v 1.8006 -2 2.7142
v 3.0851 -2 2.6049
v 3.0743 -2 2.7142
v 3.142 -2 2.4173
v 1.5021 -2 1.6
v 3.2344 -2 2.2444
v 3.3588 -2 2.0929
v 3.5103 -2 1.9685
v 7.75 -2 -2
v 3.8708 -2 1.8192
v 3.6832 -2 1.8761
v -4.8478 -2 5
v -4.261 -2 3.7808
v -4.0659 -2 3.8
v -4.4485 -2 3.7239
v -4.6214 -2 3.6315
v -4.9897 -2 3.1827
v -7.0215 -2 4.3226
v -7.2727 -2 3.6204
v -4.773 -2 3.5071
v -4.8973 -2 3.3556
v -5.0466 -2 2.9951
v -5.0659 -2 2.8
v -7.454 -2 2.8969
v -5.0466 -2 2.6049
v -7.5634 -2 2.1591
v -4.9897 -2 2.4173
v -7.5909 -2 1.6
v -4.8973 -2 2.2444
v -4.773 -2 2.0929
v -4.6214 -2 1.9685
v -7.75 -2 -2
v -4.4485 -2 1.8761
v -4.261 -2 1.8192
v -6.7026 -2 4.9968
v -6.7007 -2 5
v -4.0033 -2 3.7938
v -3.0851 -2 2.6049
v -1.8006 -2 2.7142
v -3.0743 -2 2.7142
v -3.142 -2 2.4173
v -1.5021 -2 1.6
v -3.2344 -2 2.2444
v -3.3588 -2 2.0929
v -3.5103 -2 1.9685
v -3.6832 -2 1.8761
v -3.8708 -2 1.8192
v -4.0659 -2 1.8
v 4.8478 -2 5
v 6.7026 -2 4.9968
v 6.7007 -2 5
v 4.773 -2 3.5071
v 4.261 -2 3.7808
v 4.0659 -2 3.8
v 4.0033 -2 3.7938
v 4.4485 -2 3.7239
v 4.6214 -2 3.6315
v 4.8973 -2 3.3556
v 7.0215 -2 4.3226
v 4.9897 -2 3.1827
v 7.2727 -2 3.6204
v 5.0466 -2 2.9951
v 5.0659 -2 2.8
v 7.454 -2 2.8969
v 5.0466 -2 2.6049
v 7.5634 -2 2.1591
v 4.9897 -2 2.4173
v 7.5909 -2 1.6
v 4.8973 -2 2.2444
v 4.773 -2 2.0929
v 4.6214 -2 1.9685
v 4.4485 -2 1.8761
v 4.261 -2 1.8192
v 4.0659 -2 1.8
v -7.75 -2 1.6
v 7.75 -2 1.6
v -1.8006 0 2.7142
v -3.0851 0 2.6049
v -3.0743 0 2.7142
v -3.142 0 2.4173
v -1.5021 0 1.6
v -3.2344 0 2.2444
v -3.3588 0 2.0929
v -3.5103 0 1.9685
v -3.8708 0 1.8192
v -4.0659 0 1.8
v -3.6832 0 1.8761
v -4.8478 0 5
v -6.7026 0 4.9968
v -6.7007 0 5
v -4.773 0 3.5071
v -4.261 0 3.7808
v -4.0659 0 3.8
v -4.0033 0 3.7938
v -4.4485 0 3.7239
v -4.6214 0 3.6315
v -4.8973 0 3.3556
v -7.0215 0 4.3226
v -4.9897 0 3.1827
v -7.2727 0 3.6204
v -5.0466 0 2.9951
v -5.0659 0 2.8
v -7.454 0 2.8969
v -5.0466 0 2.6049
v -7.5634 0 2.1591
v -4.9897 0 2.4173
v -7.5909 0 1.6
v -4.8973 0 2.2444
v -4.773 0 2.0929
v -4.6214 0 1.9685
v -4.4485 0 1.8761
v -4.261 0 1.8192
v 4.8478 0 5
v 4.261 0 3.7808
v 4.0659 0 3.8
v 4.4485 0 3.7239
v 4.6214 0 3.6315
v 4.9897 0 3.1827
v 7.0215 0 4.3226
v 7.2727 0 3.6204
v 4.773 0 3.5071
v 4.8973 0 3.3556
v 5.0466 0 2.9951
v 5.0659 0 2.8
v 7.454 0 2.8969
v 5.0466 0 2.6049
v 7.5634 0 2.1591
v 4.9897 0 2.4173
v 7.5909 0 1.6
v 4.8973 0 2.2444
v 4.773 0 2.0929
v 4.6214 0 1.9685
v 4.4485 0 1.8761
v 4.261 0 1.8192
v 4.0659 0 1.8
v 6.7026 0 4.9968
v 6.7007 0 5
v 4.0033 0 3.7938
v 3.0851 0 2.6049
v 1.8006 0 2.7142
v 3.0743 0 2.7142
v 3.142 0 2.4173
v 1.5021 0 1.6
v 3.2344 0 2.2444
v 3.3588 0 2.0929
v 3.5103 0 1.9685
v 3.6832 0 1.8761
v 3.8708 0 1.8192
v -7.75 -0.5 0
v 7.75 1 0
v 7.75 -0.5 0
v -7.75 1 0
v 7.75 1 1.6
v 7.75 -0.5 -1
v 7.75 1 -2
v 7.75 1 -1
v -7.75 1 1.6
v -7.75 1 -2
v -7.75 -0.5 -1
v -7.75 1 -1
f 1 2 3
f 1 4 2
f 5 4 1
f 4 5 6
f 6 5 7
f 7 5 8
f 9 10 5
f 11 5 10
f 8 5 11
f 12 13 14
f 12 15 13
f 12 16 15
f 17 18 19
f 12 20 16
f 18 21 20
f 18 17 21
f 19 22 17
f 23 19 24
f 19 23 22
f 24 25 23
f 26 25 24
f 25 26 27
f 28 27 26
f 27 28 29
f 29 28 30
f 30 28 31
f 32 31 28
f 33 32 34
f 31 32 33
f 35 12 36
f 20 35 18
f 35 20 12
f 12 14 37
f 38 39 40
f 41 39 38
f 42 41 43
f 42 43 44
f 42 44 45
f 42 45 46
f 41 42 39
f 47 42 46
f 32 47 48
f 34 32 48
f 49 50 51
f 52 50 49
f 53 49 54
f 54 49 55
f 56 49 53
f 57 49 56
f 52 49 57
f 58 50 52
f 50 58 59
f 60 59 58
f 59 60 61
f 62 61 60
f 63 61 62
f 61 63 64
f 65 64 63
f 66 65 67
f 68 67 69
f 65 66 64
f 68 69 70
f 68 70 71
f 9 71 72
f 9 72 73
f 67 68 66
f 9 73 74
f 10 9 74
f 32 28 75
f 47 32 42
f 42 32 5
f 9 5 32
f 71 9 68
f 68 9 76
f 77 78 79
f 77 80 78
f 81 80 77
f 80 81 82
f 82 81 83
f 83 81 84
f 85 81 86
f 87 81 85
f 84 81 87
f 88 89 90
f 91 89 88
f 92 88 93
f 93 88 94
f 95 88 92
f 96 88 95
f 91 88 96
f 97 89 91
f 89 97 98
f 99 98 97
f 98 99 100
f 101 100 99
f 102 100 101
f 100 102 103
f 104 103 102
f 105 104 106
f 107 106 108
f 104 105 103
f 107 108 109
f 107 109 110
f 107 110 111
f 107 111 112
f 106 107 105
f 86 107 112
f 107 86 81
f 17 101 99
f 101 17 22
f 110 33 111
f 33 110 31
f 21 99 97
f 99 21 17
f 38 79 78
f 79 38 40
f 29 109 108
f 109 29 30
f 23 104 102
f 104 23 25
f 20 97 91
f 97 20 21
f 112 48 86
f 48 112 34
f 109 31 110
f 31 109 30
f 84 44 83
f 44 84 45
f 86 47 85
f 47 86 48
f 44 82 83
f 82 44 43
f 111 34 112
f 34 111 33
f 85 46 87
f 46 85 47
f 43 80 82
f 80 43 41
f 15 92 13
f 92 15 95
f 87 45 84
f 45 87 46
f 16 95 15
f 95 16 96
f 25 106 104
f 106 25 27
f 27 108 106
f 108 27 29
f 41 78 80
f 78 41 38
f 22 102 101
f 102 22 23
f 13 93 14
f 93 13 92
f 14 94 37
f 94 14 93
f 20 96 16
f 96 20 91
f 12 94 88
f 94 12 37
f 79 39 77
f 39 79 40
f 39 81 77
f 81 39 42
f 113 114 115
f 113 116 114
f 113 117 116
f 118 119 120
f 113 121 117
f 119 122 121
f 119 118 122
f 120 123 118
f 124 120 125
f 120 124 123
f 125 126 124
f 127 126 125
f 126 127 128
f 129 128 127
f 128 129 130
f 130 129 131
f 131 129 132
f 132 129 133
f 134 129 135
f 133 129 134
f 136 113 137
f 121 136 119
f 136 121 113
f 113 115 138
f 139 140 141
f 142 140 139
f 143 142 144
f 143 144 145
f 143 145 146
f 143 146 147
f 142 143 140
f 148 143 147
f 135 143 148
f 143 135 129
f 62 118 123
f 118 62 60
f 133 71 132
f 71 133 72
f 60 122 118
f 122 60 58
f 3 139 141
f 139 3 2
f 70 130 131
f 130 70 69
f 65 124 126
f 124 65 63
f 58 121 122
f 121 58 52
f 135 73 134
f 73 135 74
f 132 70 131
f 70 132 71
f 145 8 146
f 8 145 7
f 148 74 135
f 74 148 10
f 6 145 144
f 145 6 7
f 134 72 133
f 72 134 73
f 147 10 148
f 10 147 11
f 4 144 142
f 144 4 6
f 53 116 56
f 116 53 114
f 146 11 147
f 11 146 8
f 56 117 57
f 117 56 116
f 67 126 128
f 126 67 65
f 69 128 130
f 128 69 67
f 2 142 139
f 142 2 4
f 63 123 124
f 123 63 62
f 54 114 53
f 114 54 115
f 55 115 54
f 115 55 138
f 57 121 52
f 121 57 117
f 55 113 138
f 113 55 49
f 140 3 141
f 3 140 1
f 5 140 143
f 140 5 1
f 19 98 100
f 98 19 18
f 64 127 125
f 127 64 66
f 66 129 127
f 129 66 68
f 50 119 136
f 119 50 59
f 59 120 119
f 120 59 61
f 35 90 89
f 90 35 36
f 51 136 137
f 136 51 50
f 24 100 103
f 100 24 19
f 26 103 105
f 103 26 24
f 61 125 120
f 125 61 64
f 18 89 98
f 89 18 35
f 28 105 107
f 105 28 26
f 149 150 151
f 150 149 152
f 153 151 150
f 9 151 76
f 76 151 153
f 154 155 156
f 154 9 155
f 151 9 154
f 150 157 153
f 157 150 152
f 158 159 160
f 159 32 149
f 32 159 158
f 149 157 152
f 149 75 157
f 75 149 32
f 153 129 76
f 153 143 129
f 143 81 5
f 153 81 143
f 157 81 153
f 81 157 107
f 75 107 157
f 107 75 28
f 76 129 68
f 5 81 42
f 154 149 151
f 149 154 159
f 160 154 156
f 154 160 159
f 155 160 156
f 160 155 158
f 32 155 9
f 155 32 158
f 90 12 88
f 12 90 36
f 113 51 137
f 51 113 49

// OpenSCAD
DEBUG_LAYER = 10;
WIRE_DIAMETER = 2;
WIRE_RADIUS = WIRE_DIAMETER / 2;
MARBLE_DIAMETER = 9.5;
MARBLE_RADIUS = MARBLE_DIAMETER / 2;
HOLDER_WIDTH = 1.5;
DEFAULT_SPACE_OFFSET = 1.1;
DEFAULT_HEIGHT = 2;
SQRT22 = sqrt(2) / 2;

module tube(inner, outer, h = DEFAULT_HEIGHT, $fn = 32) {
    in = min(outer, inner);
    out = max(outer, inner);
    
    difference() {
        cylinder(h, out, out, $fn);
        translate([0, 0, -1]) 
            cylinder(h+2, in, in,  $fn);
    };
}

module rtCylinder(radius, posX, rotate, isTrim = false, h = DEFAULT_HEIGHT, $fn = 32, $posY = 0, $innerRotation = 0) {    
    rotate(rotate) {
        if (isTrim) {            
            translate([posX, $posY, -1])
                rotate($innerRotation)
                    cylinder(h + 2, radius, radius, $fn = $fn);
        } else {
            translate([posX, $posY, 0])
                rotate($innerRotation)
                    cylinder(h, radius, radius, $fn = $fn);
        }        
    }; 
}

module rtCube(width, length, posX, rotate, isTrim = false, h = DEFAULT_HEIGHT, $center = false, $posY = 0) {
    translateZ = $center ? h / 2 : isTrim ? -1 : 0;
    height = isTrim ? h + 2 : h;
    
    rotate(rotate)
        translate([posX, $posY, translateZ])
            cube([width, length, height], center = $center);
}



module wireHolder(scale = 1, rotate = -135, width = 1, h = DEFAULT_HEIGHT) {
    wireRadius = WIRE_RADIUS * scale;
    
    difference() {
        rotate([0, 0, rotate])
            translate([MARBLE_RADIUS + wireRadius, 0, 0]) {
                cutSide = wireRadius * 3;
                
                difference() {   
                    tube(wireRadius, cutSide * 1.2, h);
                                        
                    rtCube(cutSide, cutSide, -wireRadius * 2 * SQRT22, 80, true, h, $center = true, $posY = cutSide * SQRT22);                rtCube(cutSide, cutSide, -wireRadius * 2 * SQRT22, 45, true, h, $center = true, $posY = cutSide * SQRT22);        

                    rtCube(
                        MARBLE_RADIUS * 2, 
                        MARBLE_RADIUS * .8, 
                        -wireRadius, 
                        60, 
                        true, 
                        h, 
                        $center = true, 
                        $posY = (wireRadius * SQRT22) + (MARBLE_RADIUS * SQRT22)
                    );                
                }
                
        }
    }
   
    translate([MARBLE_RADIUS + (wireRadius * 2.2), 0, 0])
        rtCylinder(wireRadius * 3, wireRadius * 3, rotate - 15, 0, $fn = 3, $posY = (wireRadius * 7.4 * (sqrt(2) / 2)));
}

module base(holderOffset, scale = 1, h = DEFAULT_HEIGHT) {
    wireRadius = WIRE_RADIUS * scale;
    
    difference() {
        rtCube(
            MARBLE_DIAMETER * 1.25, 
            h, 
            -MARBLE_RADIUS * 1.25,
            0,
            false,
            h,
            $posY = -holderOffset - (DEFAULT_HEIGHT * .9)
        );


        rotate([0, 0, -45])
            translate([MARBLE_RADIUS + wireRadius, 0, -2])
                cylinder(h + 4, wireRadius, wireRadius, $fn=32); 
        
        rotate([0, 0, -135])
            translate([MARBLE_RADIUS + wireRadius, 0, -2])
                cylinder(h + 4, wireRadius, wireRadius, $fn=32); 
                    
    }
}

module bracket(scale = 1, h = DEFAULT_HEIGHT) {
    wireRadius = WIRE_RADIUS * scale;
    holderOffset = ((MARBLE_RADIUS + wireRadius) * sqrt(2) / 2) + wireRadius;

    translate([0, 0, holderOffset + DEFAULT_HEIGHT * .9]) 
        rotate([90, 0, 0])  {
            // FULL BASE    
            difference() {
                union() {
                    wireHolder(scale);
                    mirror([90, 0, 0])
                        wireHolder(scale);
                   
                   *base(holderOffset, scale, h);
                    

                    *color("#ff0000") {
                        circle(MARBLE_RADIUS, $fn=32);
                        
                        rotate([0, 0, -135])
                            translate([MARBLE_RADIUS + WIRE_RADIUS, 0, -1])
                                circle(WIRE_RADIUS, $fn=32); 
                        
                        rotate([0, 0, -45])
                            translate([MARBLE_RADIUS + WIRE_RADIUS, 0, -1])
                                circle(WIRE_RADIUS, $fn=32); 
                    }
                    
                }               
            }      
    }
}



baseScale = 1;
spacing = 1.5;
lastY = 0;
theScale = 1;
baseWidth = MARBLE_DIAMETER + (WIRE_RADIUS * theScale * 6);
        
difference() {

    union() {
        translate([0, 0, 0])
        difference() {
            bracket(theScale);
                   
            translate([0, 0, -2]) rtCube(20, 10, 0, 0, $center = true);
                        
            rotate([90, 0, 0])
                translate([0, 2 * SQRT22, -1])
                    tube(MARBLE_RADIUS * 1.6, MARBLE_DIAMETER * 2, (DEFAULT_HEIGHT * theScale) + 2, $fn = 64);
                }
                   

            translate([-baseWidth / 2, 1, 0])
                    rotate([90, 0, 0]) {
                        rtCube(baseWidth, WIRE_DIAMETER * .8, 0, 0, h = DEFAULT_HEIGHT + 1);
                        translate([0, -1, 1.5])
                            rtCube(baseWidth, 1, 0, 0, h = DEFAULT_HEIGHT - .5 );
                        translate([0, -2, 0])
                            rtCube(baseWidth, 1, 0, 0, h = DEFAULT_HEIGHT + 1);
                    }
    } 
      
    translate([-MARBLE_DIAMETER, -DEFAULT_HEIGHT - 1, WIRE_DIAMETER * 2 + 1])
        rtCube(MARBLE_DIAMETER * 2, DEFAULT_HEIGHT + 2, 0, 0, h = WIRE_DIAMETER * 2);  
}        
